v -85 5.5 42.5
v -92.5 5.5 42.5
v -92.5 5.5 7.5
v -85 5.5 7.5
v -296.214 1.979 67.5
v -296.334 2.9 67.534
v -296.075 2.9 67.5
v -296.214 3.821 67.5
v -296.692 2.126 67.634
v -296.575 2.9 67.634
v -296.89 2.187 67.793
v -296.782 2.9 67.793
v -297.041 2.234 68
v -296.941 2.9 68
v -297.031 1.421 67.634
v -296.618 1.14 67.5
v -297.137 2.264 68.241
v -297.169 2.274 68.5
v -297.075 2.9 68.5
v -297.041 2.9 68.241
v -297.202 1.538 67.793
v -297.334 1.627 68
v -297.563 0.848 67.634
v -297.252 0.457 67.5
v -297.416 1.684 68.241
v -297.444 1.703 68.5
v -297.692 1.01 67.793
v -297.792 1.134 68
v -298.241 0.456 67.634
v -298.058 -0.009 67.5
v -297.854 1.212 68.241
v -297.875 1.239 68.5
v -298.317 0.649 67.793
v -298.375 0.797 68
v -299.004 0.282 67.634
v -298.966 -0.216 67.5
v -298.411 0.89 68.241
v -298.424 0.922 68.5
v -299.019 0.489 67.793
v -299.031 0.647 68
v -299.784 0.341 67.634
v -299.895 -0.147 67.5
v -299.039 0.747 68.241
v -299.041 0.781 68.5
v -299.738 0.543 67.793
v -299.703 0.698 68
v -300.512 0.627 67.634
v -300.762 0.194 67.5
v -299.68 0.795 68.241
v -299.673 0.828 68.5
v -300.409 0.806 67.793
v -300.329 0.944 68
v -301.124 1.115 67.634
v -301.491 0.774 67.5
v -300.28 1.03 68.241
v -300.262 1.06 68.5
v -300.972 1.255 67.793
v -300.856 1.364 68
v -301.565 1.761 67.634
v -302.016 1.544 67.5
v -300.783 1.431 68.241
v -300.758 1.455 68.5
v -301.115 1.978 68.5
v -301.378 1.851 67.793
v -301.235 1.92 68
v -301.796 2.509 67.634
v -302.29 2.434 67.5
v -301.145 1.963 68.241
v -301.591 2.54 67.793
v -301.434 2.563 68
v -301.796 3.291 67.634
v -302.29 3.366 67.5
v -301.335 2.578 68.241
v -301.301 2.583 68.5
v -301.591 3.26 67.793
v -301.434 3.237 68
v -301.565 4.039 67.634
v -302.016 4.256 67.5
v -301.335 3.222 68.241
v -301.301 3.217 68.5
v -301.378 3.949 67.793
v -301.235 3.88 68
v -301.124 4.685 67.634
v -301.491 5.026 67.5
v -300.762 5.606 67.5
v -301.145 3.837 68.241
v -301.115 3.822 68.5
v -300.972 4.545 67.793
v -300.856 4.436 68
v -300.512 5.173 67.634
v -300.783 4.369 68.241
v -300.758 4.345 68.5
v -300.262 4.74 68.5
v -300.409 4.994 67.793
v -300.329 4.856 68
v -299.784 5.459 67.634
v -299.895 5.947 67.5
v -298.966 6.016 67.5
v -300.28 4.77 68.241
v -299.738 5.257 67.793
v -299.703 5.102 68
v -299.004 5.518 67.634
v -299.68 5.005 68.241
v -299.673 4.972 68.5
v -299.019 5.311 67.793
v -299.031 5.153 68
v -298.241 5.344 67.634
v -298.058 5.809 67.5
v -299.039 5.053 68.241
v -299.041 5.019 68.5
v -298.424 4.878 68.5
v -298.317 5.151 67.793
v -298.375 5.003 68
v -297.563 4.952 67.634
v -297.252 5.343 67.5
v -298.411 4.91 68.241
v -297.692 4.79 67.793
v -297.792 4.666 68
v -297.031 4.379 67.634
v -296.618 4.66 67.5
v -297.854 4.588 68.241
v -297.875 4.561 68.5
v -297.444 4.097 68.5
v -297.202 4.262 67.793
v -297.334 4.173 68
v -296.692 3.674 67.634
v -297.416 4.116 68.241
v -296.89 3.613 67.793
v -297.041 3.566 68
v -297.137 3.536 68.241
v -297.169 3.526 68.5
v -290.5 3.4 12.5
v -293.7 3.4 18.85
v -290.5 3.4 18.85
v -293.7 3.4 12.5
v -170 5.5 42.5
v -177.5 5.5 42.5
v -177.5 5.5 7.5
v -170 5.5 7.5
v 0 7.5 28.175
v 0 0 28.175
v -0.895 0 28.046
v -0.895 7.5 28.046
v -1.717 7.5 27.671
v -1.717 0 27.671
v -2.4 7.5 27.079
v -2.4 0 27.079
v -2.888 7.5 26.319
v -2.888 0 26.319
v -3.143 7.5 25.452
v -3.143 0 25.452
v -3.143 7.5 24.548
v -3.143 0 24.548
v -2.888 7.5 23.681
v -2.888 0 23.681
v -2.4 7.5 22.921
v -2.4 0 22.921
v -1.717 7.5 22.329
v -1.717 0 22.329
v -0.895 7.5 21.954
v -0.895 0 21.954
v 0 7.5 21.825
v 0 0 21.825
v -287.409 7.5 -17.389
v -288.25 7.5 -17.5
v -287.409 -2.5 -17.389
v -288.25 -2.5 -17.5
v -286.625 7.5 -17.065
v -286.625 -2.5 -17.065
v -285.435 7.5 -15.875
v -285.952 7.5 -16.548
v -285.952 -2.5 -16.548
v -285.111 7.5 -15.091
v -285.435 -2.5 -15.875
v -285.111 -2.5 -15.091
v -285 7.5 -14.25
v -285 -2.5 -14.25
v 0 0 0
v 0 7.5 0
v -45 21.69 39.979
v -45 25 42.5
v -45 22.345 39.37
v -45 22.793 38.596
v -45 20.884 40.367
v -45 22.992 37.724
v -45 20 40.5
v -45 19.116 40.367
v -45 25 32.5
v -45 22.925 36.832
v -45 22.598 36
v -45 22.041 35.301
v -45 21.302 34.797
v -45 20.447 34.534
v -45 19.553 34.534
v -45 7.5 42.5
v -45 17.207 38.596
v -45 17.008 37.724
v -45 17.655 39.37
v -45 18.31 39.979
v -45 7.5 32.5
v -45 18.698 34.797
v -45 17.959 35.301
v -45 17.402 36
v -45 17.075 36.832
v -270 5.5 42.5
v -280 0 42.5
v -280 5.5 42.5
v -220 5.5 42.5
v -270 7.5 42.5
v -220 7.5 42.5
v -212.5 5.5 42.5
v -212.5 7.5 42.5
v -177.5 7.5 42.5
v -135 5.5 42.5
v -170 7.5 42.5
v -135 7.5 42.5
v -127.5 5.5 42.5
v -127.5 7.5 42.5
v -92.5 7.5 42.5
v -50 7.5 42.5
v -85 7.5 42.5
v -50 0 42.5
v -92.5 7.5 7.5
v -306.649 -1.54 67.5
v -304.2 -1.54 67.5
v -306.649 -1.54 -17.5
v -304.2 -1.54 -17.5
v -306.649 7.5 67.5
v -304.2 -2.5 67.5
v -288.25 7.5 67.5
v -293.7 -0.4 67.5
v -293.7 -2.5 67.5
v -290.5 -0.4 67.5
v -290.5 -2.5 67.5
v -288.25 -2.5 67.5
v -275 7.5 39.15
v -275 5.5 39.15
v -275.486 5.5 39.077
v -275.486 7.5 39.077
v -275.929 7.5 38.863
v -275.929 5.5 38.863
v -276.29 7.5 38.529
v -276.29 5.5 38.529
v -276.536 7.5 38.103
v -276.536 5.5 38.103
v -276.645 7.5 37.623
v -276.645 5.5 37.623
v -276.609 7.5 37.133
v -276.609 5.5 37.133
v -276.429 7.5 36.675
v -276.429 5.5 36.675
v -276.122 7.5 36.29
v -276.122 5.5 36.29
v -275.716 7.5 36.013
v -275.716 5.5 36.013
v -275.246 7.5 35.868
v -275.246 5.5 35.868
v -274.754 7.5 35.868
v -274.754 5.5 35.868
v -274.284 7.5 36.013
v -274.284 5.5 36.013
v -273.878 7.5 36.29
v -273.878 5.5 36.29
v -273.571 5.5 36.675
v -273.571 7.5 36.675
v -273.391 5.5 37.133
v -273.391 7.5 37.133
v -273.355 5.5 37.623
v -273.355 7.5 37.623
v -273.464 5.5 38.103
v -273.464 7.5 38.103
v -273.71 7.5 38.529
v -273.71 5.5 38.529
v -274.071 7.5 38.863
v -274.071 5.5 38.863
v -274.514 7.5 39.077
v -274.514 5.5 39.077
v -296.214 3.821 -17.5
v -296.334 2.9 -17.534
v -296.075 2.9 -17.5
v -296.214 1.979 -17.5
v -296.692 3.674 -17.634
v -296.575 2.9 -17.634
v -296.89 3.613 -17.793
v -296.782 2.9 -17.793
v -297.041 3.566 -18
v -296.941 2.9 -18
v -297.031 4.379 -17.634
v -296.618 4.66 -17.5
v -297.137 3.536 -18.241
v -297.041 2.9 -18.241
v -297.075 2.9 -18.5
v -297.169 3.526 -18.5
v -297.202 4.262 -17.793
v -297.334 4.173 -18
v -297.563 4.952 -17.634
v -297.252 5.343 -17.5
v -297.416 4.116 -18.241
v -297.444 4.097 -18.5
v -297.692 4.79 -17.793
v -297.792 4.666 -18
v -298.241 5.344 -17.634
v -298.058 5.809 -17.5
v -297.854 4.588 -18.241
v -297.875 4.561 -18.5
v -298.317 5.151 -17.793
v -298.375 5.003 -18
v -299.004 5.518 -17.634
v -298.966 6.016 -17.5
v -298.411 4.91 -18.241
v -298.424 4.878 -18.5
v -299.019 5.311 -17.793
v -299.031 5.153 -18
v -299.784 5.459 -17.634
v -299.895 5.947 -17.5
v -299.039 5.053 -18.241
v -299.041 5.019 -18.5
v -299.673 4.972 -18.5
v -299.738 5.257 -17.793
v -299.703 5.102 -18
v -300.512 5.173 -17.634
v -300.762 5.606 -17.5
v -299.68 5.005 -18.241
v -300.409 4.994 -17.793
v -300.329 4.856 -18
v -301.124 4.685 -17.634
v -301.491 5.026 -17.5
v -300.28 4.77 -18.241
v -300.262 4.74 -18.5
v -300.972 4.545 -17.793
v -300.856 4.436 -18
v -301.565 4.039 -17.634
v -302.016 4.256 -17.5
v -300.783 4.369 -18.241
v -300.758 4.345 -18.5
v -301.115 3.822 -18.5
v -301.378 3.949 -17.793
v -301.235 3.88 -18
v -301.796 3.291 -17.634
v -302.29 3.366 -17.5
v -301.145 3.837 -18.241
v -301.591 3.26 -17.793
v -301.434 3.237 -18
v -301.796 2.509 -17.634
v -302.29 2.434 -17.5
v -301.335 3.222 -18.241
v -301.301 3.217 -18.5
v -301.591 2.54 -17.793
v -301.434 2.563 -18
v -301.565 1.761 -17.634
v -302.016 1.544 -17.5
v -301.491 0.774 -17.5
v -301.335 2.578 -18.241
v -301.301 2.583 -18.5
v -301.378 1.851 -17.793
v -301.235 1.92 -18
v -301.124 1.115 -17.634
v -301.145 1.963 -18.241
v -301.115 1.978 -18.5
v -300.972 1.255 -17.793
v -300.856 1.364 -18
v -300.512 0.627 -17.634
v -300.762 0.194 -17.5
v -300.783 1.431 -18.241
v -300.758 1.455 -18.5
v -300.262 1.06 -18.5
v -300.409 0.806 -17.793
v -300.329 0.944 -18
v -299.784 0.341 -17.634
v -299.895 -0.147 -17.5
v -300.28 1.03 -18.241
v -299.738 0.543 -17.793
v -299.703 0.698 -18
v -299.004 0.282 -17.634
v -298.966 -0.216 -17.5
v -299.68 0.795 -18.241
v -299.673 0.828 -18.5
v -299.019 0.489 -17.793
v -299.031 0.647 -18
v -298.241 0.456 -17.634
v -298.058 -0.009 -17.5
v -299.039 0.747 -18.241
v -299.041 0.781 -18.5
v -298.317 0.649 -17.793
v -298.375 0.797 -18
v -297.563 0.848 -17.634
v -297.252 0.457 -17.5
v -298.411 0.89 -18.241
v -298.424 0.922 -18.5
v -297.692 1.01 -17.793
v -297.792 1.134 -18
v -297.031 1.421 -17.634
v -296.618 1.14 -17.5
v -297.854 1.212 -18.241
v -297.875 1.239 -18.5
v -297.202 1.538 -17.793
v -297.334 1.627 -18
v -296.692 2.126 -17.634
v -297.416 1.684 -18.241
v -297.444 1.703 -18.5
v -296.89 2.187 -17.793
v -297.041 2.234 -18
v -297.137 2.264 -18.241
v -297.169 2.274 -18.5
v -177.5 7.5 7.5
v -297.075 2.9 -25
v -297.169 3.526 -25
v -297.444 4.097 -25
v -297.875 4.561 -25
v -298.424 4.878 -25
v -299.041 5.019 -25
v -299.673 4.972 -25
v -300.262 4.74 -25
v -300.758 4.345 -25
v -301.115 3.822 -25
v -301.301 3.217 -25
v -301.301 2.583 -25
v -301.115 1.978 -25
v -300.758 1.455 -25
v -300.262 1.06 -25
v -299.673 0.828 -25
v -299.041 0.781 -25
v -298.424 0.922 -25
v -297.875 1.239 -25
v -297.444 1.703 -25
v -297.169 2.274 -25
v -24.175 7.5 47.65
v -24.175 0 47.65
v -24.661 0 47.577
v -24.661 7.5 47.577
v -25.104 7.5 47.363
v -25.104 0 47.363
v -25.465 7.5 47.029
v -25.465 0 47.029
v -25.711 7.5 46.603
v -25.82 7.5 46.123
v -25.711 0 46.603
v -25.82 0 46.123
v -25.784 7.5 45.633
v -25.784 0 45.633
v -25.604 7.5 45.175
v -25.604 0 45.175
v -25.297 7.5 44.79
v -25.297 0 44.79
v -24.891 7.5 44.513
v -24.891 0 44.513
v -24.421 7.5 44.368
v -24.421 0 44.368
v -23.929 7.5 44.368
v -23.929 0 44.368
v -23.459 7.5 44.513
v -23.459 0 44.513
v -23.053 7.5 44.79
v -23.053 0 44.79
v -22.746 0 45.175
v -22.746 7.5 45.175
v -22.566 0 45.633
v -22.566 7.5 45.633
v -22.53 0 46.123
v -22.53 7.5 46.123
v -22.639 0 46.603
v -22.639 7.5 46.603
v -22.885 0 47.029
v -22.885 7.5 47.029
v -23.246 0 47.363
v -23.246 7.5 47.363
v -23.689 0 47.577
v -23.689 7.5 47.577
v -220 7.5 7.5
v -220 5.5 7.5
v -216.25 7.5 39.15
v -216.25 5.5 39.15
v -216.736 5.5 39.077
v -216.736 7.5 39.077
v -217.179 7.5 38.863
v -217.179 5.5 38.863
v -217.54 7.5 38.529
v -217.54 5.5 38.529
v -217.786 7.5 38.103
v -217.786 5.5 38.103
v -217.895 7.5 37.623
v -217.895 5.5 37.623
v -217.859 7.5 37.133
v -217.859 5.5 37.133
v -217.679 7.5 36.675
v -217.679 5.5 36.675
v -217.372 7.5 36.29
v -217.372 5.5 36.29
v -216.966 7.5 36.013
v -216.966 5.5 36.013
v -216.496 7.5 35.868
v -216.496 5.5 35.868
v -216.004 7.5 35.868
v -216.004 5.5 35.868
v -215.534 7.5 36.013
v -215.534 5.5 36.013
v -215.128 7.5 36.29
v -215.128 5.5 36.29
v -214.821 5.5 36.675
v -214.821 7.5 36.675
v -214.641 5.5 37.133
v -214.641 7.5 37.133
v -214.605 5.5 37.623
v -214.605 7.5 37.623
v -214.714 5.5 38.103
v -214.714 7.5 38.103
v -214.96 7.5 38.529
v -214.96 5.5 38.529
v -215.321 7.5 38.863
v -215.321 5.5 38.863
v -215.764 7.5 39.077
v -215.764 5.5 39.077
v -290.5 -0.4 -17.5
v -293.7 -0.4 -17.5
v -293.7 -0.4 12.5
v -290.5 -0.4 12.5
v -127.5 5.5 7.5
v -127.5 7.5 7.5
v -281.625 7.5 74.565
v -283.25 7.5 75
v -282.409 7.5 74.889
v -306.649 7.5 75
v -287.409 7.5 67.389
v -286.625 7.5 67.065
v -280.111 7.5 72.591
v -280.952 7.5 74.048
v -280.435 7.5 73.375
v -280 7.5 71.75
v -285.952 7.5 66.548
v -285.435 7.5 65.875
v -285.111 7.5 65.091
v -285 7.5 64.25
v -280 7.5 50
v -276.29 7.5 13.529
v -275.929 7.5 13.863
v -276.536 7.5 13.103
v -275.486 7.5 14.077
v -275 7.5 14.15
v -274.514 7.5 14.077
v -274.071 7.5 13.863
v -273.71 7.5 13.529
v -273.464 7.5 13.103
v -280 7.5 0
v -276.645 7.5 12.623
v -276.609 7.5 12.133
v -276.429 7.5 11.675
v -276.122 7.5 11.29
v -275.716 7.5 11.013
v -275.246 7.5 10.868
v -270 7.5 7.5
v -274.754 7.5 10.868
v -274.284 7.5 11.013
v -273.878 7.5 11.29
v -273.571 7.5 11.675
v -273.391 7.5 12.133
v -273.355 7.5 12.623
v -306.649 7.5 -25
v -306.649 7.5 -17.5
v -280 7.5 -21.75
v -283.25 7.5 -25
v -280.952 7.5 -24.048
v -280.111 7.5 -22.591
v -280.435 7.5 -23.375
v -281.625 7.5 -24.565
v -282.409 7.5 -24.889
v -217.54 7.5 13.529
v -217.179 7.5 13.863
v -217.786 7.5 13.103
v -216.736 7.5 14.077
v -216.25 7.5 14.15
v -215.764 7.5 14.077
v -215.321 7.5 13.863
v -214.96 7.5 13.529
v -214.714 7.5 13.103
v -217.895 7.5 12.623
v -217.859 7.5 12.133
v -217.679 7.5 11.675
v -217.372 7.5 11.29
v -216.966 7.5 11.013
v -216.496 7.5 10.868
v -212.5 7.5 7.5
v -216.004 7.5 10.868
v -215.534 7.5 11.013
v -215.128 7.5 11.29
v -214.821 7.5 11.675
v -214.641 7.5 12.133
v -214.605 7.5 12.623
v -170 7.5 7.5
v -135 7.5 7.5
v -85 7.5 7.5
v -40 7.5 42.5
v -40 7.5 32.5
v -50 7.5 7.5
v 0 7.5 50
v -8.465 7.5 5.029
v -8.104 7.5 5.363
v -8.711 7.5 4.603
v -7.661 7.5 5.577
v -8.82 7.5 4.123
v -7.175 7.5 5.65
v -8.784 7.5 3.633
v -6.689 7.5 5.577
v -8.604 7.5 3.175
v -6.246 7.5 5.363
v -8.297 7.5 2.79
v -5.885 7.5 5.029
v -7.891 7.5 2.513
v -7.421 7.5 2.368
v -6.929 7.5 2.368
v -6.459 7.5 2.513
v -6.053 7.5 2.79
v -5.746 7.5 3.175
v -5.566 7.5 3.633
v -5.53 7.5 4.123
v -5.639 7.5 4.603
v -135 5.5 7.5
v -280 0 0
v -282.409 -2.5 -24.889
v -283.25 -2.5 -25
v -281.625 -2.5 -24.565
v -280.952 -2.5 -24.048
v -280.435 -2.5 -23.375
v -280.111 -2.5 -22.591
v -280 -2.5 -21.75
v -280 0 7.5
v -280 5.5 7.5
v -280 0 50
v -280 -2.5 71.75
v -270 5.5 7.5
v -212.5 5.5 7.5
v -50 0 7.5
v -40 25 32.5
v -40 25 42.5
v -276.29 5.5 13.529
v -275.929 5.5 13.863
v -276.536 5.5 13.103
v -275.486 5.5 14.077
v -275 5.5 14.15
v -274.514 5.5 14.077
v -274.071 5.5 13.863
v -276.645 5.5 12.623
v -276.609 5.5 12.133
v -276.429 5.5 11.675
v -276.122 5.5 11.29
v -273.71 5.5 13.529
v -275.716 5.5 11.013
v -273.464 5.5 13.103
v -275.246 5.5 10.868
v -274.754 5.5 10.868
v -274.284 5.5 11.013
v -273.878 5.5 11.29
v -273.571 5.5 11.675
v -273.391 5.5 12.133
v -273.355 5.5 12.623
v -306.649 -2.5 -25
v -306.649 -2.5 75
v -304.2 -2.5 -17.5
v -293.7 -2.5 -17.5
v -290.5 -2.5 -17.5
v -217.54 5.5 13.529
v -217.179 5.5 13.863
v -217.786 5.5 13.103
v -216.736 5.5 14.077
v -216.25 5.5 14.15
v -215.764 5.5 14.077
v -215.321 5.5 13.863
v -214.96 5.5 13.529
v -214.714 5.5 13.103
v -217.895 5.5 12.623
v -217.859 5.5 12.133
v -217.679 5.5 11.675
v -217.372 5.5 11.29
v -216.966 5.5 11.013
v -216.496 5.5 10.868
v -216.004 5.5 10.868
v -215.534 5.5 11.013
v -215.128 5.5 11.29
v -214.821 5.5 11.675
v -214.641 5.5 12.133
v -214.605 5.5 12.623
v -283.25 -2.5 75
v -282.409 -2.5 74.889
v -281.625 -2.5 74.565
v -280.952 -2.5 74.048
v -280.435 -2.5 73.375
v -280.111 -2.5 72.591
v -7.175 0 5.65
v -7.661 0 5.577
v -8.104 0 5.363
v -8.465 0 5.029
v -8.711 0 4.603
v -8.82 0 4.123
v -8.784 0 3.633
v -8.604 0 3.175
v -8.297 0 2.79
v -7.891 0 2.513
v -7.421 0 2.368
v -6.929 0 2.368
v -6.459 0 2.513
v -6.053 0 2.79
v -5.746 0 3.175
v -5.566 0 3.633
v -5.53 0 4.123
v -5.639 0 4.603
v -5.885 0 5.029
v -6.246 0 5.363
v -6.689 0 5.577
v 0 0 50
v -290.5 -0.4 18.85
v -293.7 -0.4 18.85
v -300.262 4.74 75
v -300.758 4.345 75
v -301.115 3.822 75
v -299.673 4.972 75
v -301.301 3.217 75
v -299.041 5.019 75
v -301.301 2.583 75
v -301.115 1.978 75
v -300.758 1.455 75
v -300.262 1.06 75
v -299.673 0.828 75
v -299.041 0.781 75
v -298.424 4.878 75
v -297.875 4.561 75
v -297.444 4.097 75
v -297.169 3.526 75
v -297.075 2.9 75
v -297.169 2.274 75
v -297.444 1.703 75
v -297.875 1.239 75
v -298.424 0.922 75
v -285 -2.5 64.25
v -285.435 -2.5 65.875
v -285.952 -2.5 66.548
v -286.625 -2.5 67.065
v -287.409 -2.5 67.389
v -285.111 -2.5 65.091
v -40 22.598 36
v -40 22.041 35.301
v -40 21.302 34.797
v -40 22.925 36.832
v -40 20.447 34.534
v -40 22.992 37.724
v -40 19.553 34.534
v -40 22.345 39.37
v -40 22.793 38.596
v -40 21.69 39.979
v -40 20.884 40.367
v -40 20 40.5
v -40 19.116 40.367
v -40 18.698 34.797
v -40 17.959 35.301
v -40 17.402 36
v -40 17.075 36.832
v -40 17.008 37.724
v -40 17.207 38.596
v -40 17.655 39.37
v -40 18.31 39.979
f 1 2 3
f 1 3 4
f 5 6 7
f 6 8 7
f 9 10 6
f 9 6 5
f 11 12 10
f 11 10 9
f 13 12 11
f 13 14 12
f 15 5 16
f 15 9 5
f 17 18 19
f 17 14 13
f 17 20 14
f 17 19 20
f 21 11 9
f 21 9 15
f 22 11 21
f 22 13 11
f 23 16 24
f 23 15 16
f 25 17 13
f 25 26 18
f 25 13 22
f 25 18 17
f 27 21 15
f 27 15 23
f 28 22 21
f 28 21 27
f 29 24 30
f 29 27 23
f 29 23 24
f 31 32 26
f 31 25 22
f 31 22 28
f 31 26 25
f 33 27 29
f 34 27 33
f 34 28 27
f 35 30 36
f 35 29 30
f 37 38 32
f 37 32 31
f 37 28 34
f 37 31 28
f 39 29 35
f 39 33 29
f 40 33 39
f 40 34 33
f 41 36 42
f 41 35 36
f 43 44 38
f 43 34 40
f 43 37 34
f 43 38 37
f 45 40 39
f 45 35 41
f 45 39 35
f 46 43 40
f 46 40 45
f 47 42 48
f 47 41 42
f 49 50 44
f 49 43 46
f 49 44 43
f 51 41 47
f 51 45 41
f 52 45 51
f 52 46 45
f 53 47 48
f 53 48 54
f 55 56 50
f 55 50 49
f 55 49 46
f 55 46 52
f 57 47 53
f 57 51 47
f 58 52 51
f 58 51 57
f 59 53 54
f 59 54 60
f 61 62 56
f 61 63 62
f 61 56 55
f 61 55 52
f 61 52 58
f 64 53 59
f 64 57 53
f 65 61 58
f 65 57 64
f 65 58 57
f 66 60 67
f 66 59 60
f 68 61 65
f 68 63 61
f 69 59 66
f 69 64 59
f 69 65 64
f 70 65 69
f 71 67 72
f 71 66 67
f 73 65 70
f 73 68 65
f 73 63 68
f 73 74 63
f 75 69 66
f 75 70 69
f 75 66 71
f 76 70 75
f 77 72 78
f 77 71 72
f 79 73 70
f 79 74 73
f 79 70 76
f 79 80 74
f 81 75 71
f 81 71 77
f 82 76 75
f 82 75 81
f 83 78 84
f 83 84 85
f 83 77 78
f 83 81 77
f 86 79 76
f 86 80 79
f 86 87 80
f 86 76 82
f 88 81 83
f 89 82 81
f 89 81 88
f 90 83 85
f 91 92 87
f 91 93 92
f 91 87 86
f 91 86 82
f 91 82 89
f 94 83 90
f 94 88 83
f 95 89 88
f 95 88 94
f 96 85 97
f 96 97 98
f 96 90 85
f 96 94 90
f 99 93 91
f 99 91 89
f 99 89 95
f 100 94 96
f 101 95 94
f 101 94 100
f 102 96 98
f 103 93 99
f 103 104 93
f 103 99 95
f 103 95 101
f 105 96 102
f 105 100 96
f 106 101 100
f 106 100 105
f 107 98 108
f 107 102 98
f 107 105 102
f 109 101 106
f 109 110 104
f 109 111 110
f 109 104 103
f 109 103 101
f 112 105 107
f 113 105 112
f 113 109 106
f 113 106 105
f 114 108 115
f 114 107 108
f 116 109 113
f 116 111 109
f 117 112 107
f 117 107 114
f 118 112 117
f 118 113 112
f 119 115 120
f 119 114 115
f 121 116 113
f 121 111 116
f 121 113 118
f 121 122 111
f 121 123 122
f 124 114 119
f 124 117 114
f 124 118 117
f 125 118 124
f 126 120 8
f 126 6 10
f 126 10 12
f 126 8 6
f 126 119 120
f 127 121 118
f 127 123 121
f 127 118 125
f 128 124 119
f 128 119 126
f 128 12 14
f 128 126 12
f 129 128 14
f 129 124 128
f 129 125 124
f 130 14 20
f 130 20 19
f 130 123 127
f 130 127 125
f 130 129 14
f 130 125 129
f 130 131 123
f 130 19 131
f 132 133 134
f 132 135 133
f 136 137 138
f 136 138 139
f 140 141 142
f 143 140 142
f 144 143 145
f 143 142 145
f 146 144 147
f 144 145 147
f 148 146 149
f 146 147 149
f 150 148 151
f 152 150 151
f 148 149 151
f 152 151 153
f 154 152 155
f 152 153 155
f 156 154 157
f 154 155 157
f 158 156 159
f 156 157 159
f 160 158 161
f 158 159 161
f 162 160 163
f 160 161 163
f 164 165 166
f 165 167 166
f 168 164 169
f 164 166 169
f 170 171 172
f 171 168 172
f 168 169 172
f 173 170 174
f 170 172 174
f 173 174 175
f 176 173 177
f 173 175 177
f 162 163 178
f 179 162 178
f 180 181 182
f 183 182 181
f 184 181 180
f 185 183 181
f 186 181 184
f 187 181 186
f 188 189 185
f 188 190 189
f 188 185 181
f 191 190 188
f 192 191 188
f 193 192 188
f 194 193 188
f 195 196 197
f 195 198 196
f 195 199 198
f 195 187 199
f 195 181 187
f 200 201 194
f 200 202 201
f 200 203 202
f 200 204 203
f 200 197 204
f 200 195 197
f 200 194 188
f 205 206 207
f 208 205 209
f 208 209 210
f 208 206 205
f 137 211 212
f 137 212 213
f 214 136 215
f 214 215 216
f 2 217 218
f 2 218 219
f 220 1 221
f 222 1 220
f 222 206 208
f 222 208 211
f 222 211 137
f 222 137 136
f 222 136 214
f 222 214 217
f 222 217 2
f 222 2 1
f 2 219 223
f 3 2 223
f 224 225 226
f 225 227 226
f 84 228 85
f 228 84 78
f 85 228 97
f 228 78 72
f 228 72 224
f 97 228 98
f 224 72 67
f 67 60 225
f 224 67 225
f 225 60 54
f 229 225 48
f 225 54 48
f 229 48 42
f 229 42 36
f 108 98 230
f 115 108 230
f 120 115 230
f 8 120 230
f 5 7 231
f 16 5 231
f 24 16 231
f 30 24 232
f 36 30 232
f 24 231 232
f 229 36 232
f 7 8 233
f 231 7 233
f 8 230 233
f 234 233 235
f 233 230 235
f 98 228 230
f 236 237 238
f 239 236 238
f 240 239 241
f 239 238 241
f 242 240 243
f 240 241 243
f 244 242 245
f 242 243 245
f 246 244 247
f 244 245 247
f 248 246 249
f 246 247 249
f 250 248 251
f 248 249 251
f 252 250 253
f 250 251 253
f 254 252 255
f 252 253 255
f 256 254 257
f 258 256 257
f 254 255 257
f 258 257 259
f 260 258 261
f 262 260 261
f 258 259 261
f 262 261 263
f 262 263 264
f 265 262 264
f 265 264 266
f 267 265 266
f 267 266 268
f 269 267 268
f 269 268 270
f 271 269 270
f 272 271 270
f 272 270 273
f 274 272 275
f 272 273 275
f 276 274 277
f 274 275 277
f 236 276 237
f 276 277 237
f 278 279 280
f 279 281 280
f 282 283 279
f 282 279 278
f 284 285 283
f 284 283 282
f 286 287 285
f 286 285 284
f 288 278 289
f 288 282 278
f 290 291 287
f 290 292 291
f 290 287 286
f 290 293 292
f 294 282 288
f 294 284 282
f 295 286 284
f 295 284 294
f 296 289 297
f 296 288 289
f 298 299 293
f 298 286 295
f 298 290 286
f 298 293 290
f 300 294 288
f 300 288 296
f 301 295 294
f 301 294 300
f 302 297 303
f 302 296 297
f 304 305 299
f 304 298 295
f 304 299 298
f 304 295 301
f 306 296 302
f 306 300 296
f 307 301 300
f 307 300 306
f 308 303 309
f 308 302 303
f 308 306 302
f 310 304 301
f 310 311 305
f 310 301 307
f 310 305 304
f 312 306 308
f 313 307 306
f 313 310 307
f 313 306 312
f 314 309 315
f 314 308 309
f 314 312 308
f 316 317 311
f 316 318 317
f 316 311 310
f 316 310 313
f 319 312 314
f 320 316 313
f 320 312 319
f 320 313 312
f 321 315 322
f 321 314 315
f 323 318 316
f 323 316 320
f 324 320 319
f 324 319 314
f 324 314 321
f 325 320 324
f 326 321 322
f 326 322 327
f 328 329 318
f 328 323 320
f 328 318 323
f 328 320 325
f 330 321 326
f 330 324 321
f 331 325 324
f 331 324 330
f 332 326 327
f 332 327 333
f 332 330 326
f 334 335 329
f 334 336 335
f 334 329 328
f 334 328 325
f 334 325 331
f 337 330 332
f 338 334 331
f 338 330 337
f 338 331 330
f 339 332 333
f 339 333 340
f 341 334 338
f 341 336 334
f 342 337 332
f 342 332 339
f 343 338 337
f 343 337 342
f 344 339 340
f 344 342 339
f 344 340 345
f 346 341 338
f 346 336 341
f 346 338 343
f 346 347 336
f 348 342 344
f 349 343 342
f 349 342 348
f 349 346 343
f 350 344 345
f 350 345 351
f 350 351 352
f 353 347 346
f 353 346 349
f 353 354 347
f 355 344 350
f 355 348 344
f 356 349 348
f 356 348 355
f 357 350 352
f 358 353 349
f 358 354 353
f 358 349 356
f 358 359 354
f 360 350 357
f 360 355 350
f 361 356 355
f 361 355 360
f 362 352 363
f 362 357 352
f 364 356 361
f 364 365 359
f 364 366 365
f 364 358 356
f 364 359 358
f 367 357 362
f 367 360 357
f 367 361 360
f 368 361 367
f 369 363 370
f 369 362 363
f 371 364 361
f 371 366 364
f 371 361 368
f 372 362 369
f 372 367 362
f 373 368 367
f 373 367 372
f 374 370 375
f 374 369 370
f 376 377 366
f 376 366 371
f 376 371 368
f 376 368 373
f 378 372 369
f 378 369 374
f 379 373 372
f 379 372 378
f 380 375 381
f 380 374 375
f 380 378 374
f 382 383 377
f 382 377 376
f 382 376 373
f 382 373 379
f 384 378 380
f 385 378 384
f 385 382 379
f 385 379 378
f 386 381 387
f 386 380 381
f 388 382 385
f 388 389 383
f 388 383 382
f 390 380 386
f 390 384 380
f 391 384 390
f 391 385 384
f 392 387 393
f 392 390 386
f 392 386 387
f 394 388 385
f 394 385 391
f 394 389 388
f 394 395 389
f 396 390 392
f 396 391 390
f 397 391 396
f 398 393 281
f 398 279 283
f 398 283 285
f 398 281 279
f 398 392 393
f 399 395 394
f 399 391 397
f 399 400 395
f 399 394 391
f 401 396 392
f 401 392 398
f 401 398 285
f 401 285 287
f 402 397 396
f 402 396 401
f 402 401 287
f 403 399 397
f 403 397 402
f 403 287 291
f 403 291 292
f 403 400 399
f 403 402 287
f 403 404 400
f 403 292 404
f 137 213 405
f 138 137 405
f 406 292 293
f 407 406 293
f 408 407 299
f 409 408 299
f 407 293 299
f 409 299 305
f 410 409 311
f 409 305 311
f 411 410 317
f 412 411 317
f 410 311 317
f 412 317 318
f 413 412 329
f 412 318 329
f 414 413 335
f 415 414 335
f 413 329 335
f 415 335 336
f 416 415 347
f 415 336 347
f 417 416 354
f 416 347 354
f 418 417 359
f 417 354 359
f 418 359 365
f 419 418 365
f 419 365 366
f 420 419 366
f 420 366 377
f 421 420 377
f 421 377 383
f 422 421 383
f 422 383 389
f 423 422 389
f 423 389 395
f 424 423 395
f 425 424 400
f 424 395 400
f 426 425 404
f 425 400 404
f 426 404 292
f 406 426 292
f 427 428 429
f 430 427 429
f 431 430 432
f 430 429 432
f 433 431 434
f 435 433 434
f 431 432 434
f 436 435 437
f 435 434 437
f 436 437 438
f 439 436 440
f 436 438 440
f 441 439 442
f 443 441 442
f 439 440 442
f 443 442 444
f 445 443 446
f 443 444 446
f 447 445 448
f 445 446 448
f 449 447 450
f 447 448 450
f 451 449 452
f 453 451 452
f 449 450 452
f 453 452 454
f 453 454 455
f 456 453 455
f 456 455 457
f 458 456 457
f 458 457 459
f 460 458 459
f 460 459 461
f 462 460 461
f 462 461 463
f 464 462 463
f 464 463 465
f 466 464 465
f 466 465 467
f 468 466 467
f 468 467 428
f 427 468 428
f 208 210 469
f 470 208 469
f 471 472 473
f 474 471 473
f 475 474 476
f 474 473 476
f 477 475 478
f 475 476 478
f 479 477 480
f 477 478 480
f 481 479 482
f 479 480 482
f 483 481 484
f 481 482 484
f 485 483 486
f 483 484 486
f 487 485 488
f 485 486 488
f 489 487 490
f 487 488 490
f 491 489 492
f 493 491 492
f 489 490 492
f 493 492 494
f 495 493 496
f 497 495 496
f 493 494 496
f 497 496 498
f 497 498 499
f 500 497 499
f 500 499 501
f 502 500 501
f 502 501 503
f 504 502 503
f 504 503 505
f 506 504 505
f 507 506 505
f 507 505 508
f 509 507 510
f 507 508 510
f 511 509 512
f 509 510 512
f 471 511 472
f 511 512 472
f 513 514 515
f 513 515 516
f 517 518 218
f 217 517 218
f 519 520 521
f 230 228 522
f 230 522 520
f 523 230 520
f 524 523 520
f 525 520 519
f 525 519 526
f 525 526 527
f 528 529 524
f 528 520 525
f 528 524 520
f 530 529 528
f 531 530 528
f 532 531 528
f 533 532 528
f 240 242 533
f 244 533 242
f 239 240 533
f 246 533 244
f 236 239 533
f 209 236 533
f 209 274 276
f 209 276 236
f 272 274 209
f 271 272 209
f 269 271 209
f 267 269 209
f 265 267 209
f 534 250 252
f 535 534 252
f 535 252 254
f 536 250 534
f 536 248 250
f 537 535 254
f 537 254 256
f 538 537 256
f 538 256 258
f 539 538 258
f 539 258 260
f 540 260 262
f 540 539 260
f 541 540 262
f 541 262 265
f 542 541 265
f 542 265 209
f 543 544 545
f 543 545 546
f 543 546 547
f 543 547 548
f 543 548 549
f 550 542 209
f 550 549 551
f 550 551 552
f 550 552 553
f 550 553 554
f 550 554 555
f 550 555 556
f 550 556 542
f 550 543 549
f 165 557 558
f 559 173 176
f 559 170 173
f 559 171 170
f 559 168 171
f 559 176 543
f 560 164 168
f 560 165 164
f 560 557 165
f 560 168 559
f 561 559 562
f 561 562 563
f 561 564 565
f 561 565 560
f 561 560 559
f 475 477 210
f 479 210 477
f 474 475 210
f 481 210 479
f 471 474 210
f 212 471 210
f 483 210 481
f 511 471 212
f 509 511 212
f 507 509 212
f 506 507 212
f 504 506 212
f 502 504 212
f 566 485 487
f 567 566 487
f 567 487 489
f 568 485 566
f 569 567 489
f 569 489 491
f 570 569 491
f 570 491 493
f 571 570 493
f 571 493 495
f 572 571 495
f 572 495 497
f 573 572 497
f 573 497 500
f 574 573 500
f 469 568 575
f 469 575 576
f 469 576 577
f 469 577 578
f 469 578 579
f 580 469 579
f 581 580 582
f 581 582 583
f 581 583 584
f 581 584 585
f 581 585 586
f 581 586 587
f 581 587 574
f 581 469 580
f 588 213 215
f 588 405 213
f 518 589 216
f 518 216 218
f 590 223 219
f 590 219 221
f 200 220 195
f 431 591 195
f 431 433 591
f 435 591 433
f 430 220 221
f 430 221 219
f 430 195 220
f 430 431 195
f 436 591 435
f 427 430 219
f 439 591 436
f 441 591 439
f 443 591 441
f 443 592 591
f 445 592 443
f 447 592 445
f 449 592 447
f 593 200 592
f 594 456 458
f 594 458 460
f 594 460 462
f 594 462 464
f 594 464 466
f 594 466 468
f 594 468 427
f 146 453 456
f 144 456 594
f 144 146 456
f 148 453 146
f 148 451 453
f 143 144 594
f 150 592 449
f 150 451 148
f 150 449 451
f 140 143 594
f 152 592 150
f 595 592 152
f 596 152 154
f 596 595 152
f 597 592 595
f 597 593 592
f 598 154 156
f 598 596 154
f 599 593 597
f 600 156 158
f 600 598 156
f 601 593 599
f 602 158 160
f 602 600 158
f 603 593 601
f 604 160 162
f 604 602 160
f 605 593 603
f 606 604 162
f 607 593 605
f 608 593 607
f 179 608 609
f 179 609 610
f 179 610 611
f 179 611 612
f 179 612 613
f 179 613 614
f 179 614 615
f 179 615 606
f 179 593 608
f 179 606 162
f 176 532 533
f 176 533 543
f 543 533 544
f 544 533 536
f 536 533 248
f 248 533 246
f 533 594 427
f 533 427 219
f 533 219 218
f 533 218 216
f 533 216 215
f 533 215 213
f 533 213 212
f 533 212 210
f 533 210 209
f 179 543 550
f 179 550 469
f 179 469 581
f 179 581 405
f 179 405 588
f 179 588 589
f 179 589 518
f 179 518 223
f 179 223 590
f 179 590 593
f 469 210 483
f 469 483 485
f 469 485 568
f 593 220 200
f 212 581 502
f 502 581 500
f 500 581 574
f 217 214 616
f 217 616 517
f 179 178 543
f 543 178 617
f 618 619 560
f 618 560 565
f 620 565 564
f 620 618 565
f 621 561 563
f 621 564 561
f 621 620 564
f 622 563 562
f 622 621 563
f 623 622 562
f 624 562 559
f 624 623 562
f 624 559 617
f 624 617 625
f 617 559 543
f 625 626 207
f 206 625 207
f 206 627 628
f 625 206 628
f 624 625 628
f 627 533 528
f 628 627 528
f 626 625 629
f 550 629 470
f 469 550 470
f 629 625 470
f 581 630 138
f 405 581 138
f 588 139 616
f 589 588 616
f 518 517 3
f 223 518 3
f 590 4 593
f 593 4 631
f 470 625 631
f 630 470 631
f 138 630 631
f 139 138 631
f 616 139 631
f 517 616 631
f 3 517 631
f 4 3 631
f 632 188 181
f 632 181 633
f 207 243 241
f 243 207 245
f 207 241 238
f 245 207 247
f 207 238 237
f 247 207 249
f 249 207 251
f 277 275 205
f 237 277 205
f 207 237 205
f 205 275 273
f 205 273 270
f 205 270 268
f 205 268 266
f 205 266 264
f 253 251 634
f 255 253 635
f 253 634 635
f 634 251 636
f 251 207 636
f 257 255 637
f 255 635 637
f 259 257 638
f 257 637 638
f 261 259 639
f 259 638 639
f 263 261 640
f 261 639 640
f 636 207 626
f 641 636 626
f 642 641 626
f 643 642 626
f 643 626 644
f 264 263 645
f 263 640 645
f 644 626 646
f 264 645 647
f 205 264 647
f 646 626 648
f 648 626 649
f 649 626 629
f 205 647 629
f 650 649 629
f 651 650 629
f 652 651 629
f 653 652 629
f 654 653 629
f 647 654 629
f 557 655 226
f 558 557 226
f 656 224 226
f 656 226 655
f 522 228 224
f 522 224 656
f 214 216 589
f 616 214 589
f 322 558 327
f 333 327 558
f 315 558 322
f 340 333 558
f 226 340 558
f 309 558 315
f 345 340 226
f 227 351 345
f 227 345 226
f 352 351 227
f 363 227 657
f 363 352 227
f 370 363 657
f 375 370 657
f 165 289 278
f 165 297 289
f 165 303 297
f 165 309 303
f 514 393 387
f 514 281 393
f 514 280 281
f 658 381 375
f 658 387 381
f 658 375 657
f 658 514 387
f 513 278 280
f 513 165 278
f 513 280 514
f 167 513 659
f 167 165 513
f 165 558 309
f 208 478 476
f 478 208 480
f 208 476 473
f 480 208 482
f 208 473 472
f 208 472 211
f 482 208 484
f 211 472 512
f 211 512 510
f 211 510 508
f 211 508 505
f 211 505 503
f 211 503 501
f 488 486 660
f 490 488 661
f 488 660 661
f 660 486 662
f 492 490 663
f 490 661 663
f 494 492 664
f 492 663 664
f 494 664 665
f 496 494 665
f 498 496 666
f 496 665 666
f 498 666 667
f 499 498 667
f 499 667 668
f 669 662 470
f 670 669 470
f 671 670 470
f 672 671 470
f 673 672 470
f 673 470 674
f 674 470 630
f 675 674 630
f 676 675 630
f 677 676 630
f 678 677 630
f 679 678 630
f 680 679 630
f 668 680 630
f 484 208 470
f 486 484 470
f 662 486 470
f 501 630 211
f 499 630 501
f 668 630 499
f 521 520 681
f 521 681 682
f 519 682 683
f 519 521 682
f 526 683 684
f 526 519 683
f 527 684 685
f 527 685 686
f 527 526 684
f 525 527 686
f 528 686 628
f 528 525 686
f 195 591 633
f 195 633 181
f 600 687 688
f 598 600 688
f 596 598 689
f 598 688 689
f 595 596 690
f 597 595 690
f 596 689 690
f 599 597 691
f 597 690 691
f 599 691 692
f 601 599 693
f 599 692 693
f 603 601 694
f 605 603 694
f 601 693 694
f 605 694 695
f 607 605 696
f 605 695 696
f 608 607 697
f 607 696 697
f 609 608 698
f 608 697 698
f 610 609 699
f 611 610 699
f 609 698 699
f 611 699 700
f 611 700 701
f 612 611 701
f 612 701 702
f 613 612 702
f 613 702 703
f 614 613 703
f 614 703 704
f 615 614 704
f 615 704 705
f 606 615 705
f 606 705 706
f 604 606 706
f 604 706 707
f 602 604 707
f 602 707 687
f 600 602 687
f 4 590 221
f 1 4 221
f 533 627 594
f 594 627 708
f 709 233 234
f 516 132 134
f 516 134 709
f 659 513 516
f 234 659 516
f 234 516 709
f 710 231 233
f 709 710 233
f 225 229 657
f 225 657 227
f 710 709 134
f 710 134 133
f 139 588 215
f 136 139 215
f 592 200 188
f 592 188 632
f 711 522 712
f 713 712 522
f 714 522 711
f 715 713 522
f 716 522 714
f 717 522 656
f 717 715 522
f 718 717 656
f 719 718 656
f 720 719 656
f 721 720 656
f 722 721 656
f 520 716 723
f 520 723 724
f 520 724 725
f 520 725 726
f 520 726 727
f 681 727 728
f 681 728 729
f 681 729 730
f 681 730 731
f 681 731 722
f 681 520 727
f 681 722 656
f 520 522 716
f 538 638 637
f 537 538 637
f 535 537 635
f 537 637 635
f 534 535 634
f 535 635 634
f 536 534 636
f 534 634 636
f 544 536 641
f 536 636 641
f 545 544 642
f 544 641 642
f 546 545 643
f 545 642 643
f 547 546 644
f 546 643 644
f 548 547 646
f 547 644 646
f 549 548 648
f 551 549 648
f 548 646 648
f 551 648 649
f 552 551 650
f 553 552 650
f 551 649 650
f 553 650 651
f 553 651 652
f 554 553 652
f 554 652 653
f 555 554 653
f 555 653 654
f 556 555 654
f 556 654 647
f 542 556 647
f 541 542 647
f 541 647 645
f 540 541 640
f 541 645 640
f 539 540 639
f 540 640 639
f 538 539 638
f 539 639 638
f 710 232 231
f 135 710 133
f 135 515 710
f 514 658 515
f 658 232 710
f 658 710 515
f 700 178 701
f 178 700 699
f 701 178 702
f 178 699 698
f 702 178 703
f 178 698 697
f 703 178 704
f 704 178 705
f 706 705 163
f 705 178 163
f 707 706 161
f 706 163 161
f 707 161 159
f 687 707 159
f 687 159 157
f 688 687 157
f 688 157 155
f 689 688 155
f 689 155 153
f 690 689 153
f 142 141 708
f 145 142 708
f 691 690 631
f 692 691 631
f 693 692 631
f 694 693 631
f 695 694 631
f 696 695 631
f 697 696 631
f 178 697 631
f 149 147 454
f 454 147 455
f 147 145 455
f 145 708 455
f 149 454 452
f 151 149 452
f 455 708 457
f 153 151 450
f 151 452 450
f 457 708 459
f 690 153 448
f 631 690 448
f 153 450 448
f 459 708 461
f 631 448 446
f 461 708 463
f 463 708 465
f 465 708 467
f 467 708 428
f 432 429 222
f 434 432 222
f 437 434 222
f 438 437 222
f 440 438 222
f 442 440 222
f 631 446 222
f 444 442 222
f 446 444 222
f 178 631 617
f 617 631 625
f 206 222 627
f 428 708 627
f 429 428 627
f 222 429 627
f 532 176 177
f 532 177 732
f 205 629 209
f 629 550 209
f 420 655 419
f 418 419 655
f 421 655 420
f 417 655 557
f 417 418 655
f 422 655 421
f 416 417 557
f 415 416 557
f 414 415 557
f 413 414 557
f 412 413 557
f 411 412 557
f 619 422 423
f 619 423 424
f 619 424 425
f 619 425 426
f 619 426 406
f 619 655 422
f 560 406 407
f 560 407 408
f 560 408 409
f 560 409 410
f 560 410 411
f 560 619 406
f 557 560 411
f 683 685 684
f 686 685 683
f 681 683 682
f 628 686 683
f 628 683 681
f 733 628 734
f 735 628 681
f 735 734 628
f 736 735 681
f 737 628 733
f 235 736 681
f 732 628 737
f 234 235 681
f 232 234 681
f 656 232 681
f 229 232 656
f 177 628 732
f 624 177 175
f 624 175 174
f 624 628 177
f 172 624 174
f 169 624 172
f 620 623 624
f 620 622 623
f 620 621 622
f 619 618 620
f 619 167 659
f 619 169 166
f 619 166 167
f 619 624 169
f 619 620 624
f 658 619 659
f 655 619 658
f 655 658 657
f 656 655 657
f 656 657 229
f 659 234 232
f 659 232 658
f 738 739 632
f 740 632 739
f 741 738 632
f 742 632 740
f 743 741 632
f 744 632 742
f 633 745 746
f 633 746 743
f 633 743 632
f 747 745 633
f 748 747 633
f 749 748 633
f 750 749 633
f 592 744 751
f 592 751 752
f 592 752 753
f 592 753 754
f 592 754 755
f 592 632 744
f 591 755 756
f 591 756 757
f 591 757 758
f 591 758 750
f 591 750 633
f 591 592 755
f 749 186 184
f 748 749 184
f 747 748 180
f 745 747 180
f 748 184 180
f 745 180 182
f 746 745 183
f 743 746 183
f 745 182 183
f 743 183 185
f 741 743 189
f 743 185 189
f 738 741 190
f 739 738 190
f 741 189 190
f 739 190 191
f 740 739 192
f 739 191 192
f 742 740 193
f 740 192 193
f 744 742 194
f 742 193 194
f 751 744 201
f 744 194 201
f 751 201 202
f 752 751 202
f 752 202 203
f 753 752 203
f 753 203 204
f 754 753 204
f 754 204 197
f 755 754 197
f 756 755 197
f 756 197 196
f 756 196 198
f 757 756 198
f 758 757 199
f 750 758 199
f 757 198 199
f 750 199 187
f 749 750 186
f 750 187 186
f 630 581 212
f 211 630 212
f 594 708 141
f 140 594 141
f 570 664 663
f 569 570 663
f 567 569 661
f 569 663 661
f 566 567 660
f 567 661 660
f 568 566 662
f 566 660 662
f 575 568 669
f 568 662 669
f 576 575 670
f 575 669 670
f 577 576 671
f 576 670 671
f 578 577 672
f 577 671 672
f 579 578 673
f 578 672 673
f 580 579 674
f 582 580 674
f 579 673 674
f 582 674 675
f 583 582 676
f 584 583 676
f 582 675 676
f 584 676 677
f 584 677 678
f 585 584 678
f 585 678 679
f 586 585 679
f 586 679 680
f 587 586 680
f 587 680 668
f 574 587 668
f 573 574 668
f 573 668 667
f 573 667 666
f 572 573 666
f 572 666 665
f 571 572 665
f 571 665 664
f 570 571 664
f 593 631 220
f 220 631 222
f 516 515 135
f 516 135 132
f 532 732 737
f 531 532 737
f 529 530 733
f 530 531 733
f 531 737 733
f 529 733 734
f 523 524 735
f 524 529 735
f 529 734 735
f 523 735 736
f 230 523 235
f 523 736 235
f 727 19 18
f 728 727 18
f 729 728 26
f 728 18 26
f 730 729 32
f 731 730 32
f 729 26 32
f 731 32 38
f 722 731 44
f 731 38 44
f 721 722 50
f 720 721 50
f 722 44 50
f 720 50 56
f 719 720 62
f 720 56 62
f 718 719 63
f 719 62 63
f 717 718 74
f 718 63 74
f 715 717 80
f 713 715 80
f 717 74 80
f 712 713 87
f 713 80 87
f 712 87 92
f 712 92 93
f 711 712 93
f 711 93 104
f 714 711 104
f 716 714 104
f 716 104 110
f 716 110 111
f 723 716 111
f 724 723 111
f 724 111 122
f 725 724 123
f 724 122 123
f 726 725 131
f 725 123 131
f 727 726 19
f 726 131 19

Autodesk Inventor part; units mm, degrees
ref_plane "YZ Plane" through (0, 0, 0) normal (1, 0, 0) x (0, 1, 0)
ref_plane "XZ Plane" through (0, 0, 0) normal (0, 1, 0) x (-1, 0, 0)
ref_plane "XY Plane" through (0, 0, 0) normal (0, 0, 1) x (1, 0, 0)
sketch "Sketch1" plane through (0, 0, 0) normal (0, 1, 0) x (-1, 0, 0)
  line L0 (0, 0) -> (50, 0)
  line L1 (50, 0) -> (50, 50)
  line L2 (50, 50) -> (0, 50)
  line L3 (0, 50) -> (0, 0)
  line L4 (50, 50) -> (290, 50)
  line L5 (290, 50) -> (290, 42.5)
  line L6 (290, 42.5) -> (50, 42.5)
  line L7 (50, 42.5) -> (50, 50)
  line L8 (50, 0) -> (290, 0)
  line L9 (290, 0) -> (290, 7.5)
  line L10 (290, 7.5) -> (50, 7.5)
  line L11 (50, 7.5) -> (50, 0)
  dimension "d0" = 50
  dimension "d1" = 50
  dimension "d2" = 240
  dimension "d3" = 7.5
  dimension "d4" = 7.5
extrude "Extrusion1" add sketch "Sketch1" along normal blind 7.5
sketch "Sketch2" plane through (0, 7.5, 0) normal (0, 1, 0) x (1, 0, 0)
  line L0 (0, -50) -> (0, 0) projected
  point P0 (0, -25)
hole "Hole1" at (0, 7.5, 25) direction (0, -1, 0) diameter 6.35 end through all
sketch "Sketch3" plane through (0, 7.5, 0) normal (0, 1, 0) x (1, 0, 0)
  line L0 (-3.175, -50) -> (-3.175, 0) construction
  line L1 (-3.175, -50) -> (-28.175, -50) construction
  line L2 (-28.175, -50) -> (-28.175, 0) construction
  line L3 (-28.175, 0) -> (-3.175, 0) construction
  point P0 (0, 0)
  point P1 (-7.175, -4)
  point P2 (-24.175, -46)
  dimension "d14" = 25
hole "Hole2" at (-7.175, 7.5, 4) at (-24.175, 7.5, 46) direction (0, -1, 0) diameter 3.3 end through all
sketch "Sketch4" plane through (0, 7.5, 0) normal (0, 1, 0) x (1, 0, 0)
  arc A0 (0, -21.825) -> (0, -28.175) centre (0, -25) ccw construction
  line L0 (-3.175, -25) -> (-28.175, -25) construction
  line L1 (-3.175, -25) -> (21.825, -25) construction
  line L2 (-290, -50) -> (0, -50) construction
  line L3 (-28.175, -50) -> (-28.175, 0) construction
  line L4 (-50, -7.5) -> (-50, -42.5) construction
  line L5 (-50, -42.5) -> (-45, -42.5) construction
  line L6 (-45, -42.5) -> (-45, -32.5) construction
  line L7 (-45, -32.5) -> (-50, -32.5) construction
  line L8 (-50, -32.5) -> (-50, -42.5) construction
  line L9 (-45, -32.5) -> (-40, -32.5)
  line L10 (-40, -32.5) -> (-40, -42.5)
  line L11 (-40, -42.5) -> (-45, -42.5)
  line L12 (-45, -42.5) -> (-45, -32.5)
  point P0 (0, 0)
  dimension "d22" = 25
  dimension "d23" = 180
  dimension "d24" = 5
  dimension "d25" = 10
  dimension "d26" = 5
extrude "Extrusion2" add sketch "Sketch4" along normal blind 17.5
sketch "Sketch5" plane through (0, 7.5, 0) normal (0, 1, 0) x (1, 0, 0)
  line L0 (-85, -7.5) -> (-85, -42.5)
  line L1 (-127.5, -7.5) -> (-127.5, -42.5)
  line L2 (-92.5, -42.5) -> (-92.5, -7.5)
  line L3 (-135, -7.5) -> (-170, -7.5) construction
  line L4 (-170, -7.5) -> (-170, -42.5) construction
  line L5 (-170, -42.5) -> (-135, -42.5) construction
  line L6 (-135, -42.5) -> (-135, -7.5) construction
  line L7 (-177.5, -7.5) -> (-212.5, -7.5) construction
  line L8 (-212.5, -7.5) -> (-212.5, -42.5) construction
  line L9 (-212.5, -42.5) -> (-177.5, -42.5) construction
  line L10 (-177.5, -42.5) -> (-177.5, -7.5) construction
  line L11 (-220, -7.5) -> (-255, -7.5) construction
  line L12 (-255, -7.5) -> (-255, -42.5) construction
  line L13 (-255, -42.5) -> (-220, -42.5) construction
  line L14 (-220, -42.5) -> (-220, -7.5) construction
  line L15 (-85, -7.5) -> (-92.5, -7.5) construction
  line L16 (-92.5, -7.5) -> (-92.5, -42.5) construction
  line L17 (-92.5, -42.5) -> (-85, -42.5) construction
  line L18 (-85, -42.5) -> (-85, -7.5) construction
  line L19 (-127.5, -7.5) -> (-135, -7.5) construction
  line L20 (-135, -7.5) -> (-135, -42.5) construction
  line L21 (-135, -42.5) -> (-127.5, -42.5) construction
  line L22 (-127.5, -42.5) -> (-127.5, -7.5) construction
  line L23 (-170, -7.5) -> (-177.5, -7.5) construction
  line L24 (-177.5, -7.5) -> (-177.5, -42.5) construction
  line L25 (-177.5, -42.5) -> (-170, -42.5) construction
  line L26 (-170, -42.5) -> (-170, -7.5) construction
  line L27 (-212.5, -7.5) -> (-220, -7.5) construction
  line L28 (-220, -7.5) -> (-220, -42.5) construction
  line L29 (-220, -42.5) -> (-212.5, -42.5) construction
  line L30 (-212.5, -42.5) -> (-212.5, -7.5) construction
  line L31 (-220, -7.5) -> (-212.5, -7.5)
  line L32 (-212.5, -7.5) -> (-212.5, -42.5)
  line L33 (-212.5, -42.5) -> (-220, -42.5)
  line L34 (-220, -42.5) -> (-220, -7.5)
  line L35 (-177.5, -7.5) -> (-170, -7.5)
  line L36 (-170, -7.5) -> (-170, -42.5)
  line L37 (-170, -42.5) -> (-177.5, -42.5)
  line L38 (-177.5, -42.5) -> (-177.5, -7.5)
  line L39 (-135, -7.5) -> (-127.5, -7.5)
  line L40 (-127.5, -7.5) -> (-127.5, -42.5)
  line L41 (-127.5, -42.5) -> (-135, -42.5)
  line L42 (-135, -42.5) -> (-135, -7.5)
  line L43 (-92.5, -7.5) -> (-85, -7.5)
  line L44 (-85, -7.5) -> (-85, -42.5)
  line L45 (-85, -42.5) -> (-92.5, -42.5)
  line L46 (-92.5, -42.5) -> (-92.5, -7.5)
  point P0 (0, 0)
  point P1 (-50, -7.5)
  dimension "d30" = 35
  dimension "d31" = 35
  dimension "d32" = 35
  dimension "d33" = 35
  dimension "d34" = 35
  dimension "d35" = 35
extrude "Extrusion3" add sketch "Sketch5" against normal blind 2
sketch "Sketch6" plane through (0, 7.5, 0) normal (0, 1, 0) x (1, 0, 0)
  line L0 (-290, 0) -> (-290, -7.5) projected
  line L1 (-290, -50) -> (0, -50) projected
  line L2 (-290, 0) -> (-280, 0)
  line L3 (-280, 0) -> (-280, -50)
  line L4 (-280, -50) -> (-290, -50)
  line L5 (-290, -50) -> (-290, 0)
  point P0 (0, 0)
  dimension "d38" = 10
extrude "Extrusion4" cut sketch "Sketch6" against normal blind 7.5
sketch "Sketch7" plane through (-280, 7.5, 0) normal (-1, 0, 0) x (0, 0, 1)
  point P0 (0, -7.5)
sketch "Sketch8" plane through (-280, 7.5, 0) normal (-1, 0, 0) x (0, 0, 1)
  line L0 (-25, 0) -> (75, 0)
  line L1 (75, 0) -> (75, -7.5)
  line L2 (75, -7.5) -> (-25, -7.5)
  line L3 (-25, -7.5) -> (-25, 0)
  line L4 (-25, 0) -> (75, 0)
  line L5 (75, 0) -> (75, -10)
  line L6 (75, -10) -> (-25, -10)
  line L7 (-25, -10) -> (-25, 0)
  point P0 (0, -7.5)
  dimension "d41" = 100
  dimension "d42" = 10
extrude "Extrusion5" add sketch "Sketch8" along normal blind 7.5
sketch "Sketch9" plane through (-287.5, 7.5, 0) normal (-1, 0, 0) x (0, 0, 1)
  line L0 (75, 0) -> (-25, 0) projected
  line L1 (-25, -10) -> (75, -10) projected
  line L2 (-25, 0) -> (-17.5, 0)
  line L3 (-17.5, 0) -> (-17.5, -10)
  line L4 (-17.5, -10) -> (-25, -10)
  line L5 (-25, -10) -> (-25, 0)
  line L6 (75, 0) -> (67.5, 0)
  line L7 (67.5, 0) -> (67.5, -10)
  line L8 (67.5, -10) -> (75, -10)
  line L9 (75, -10) -> (75, 0)
  point P0 (0, -7.5)
  dimension "d45" = 7.5
  dimension "d46" = 7.5
extrude "Extrusion6" add sketch "Sketch9" along normal blind 25 contours L9 L1 L7 L0 | L3 L1 L5 L0
sketch "Sketch10" plane through (-287.5, -2.5, -17.5) normal (0, 0, 1) x (1, 0, 0)
  line L0 (0, 0) -> (-25, 0) construction
  line L1 (0, 0) -> (-3, 0) construction
  line L2 (-3, 0) -> (-6.2, 0)
  line L3 (-6.2, 0) -> (-6.2, 2.1)
  line L4 (-6.2, 2.1) -> (-3, 2.1)
  line L5 (-3, 2.1) -> (-3, 0)
  line L6 (-6.2, 2.1) -> (-11.7, 2.1) construction
  line L7 (-11.7, 2.1) -> (-11.7, 5.4) construction
  point P0 (287.5, 2.5)
  dimension "d49" = 3
  dimension "d50" = 3.2
  dimension "d51" = 2.1
  dimension "d52" = 5.5
  dimension "d53" = 3.3
extrude "Extrusion7" add sketch "Sketch10" along normal blind 92.5
sketch "Sketch11" plane through (-287.5, -2.5, -17.5) normal (0, 0, 1) x (1, 0, 0)
  line L0 (-6.2, 2.1) -> (-3, 2.1) construction
  line L1 (-6.2, 2.1) -> (-11.7, 2.1) construction
  line L2 (-11.7, 2.1) -> (-11.7, 5.4) construction
  circle A0 centre (-11.7, 5.4) radius 2.125
  point P0 (287.5, 2.5)
  dimension "d56" = 5.5
  dimension "d57" = 3.3
  dimension "d58" = 4.25
extrude "Extrusion8" cut sketch "Sketch11" along normal mid plane 241
sketch "Sketch12" plane through (-287.5, -2.5, -17.5) normal (0, 0, 1) x (1, 0, 0)
  circle A0 centre (-11.7, 5.4) radius 2.125 construction
  line L0 (-11.7, 5.4) -> (-11.7, 0.96) construction
  line L1 (-11.7, 0.96) -> (-16.7, 0.96) construction
  line L2 (-6.2, 0) -> (-25, 0) projected
  line L3 (-16.7, 0.96) -> (-19.2, 0.96)
  line L4 (-19.2, 0.96) -> (-19.2, 0)
  line L5 (-19.2, 0) -> (-16.7, 0)
  line L6 (-16.7, 0) -> (-16.7, 0.96)
  point P0 (287.5, 2.5)
  dimension "d61" = 4.44
  dimension "d62" = 5
  dimension "d63" = 2.5
extrude "Extrusion9" add sketch "Sketch12" along normal blind 91.25
sketch "Sketch13" plane through (-293.7, -0.4, -17.5) normal (0, 1, 0) x (1, 0, 0)
  line L0 (3.2, 0) -> (3.2, -85) construction
  line L1 (3.2, 0) -> (3.2, -30) construction
  line L2 (0, 0) -> (0, -85) construction
  line L3 (3.2, -30) -> (0, -30) construction
  line L4 (0, -30) -> (0, -36.35) construction
  line L5 (0, -36.35) -> (3.2, -36.35) construction
  line L6 (3.2, -36.35) -> (3.2, -30) construction
  line L7 (0, -30) -> (3.2, -30)
  line L8 (3.2, -30) -> (3.2, -36.35)
  line L9 (3.2, -36.35) -> (0, -36.35)
  line L10 (0, -36.35) -> (0, -30)
  point P0 (293.7, -17.5)
  dimension "d66" = 30
  dimension "d67" = 6.35
extrude "Extrusion10" add sketch "Sketch13" along normal blind 3.8
sketch "Sketch14" plane through (0, 7.5, 0) normal (0, 1, 0) x (1, 0, 0)
  line L0 (-287.5, 17.5) -> (-287.5, -67.5) projected
  line L1 (-287.5, 17.5) -> (-285, 17.5)
  line L2 (-285, 17.5) -> (-285, -67.5)
  line L3 (-285, -67.5) -> (-287.5, -67.5)
  line L4 (-287.5, -67.5) -> (-287.5, 17.5)
  point P0 (0, 0)
  dimension "d70" = 2.5
extrude "Extrusion11" cut sketch "Sketch14" against normal blind 14.55
sketch "Sketch15" plane through (0, 7.5, 0) normal (0, 1, 0) x (1, 0, 0)
  line L0 (-312.5, 17.5) -> (-312.5, 25) projected
  line L1 (-280, -75) -> (-312.5, -75) projected
  line L2 (-312.5, 25) -> (-306.6488, 25)
  line L3 (-306.6488, 25) -> (-306.6488, -75)
  line L4 (-306.6488, -75) -> (-312.5, -75)
  line L5 (-312.5, -75) -> (-312.5, 25)
  point P0 (0, 0)
extrude "Extrusion12" cut sketch "Sketch15" against normal blind 14.55
fillet "Fillet1" radius 1 1 edges at (-301.325, 2.9, -17.5)
fillet "Fillet2" radius 1 1 edges at (-301.325, 2.9, 67.5)
fillet "Fillet3" radius 3.25 1 edges at (-280, 2.5, 75)
fillet "Fillet4" radius 3.25 1 edges at (-285, 2.5, 67.5)
fillet "Fillet5" radius 3.25 1 edges at (-280, 2.5, -25)
fillet "Fillet6" radius 3.25 1 edges at (-285, 2.5, -17.5)
sketch "Sketch16" plane through (0, 7.5, 0) normal (0, 1, 0) x (1, 0, 0)
  line L0 (-220, -42.5) -> (-220, -7.5) construction
  line L1 (-220, -42.5) -> (-280, -42.5) construction
  line L2 (-220, -7.5) -> (-255, -7.5) construction
  line L3 (-255, -7.5) -> (-255, -42.5) construction
  line L4 (-255, -42.5) -> (-220, -42.5) construction
  line L5 (-220, -42.5) -> (-220, -7.5) construction
  line L6 (-280, -7.5) -> (-280, 0) projected
  line L7 (-280, -7.5) -> (-270, -7.5)
  line L8 (-270, -7.5) -> (-270, -42.5)
  line L9 (-270, -42.5) -> (-280, -42.5)
  line L10 (-280, -42.5) -> (-280, -7.5)
  point P0 (0, 0)
  dimension "d81" = 35
  dimension "d82" = 10
extrude "Extrusion13" add sketch "Sketch16" against normal blind 2
sketch "Sketch17" plane through (0, 7.5, 0) normal (0, 1, 0) x (1, 0, 0)
  point P0 (0, 0)
sketch "Sketch18" plane through (0, 7.5, 0) normal (0, 1, 0) x (1, 0, 0)
  line L0 (-270, -7.5) -> (-270, -42.5) construction
  line L1 (-285, -64.25) -> (-285, 14.25) construction
  line L2 (-280, -7.5) -> (-280, 0) construction
  line L3 (-270, -7.5) -> (-280, -7.5) construction
  line L4 (-275, -7.5) -> (-275, -42.5) construction
  line L5 (-50, -42.5) -> (-280, -42.5) construction
  circle A0 centre (-275, -12.5) radius 1.8 construction
  circle A1 centre (-275, -37.5) radius 1.8 construction
  circle A2 centre (-275, -12.5) radius 1.8
  circle A3 centre (-275, -37.5) radius 1.8
  point P0 (0, 0)
  dimension "d85" = 3.6
  dimension "d86" = 3.6
hole "Hole3" at (-275, 7.5, 12.5) at (-275, 7.5, 37.5) direction (0, -1, 0) diameter 3.3 depth 15 tip angle 118
sketch "Sketch19" plane through (0, 7.5, 0) normal (0, 1, 0) x (1, 0, 0)
  circle A0 centre (-275, -12.5) radius 1.65 construction
  line L0 (-275, -12.5) -> (-212.5, -12.5) construction
  line L1 (-212.5, -7.5) -> (-212.5, -42.5) construction
  circle A1 centre (-275, -37.5) radius 1.65 construction
  line L2 (-275, -37.5) -> (-212.5, -37.5) construction
  line L3 (-220, -42.5) -> (-220, -7.5) construction
  line L4 (-220, -12.5) -> (-212.5, -12.5) construction
  line L5 (-216.25, -12.5) -> (-216.25, -37.5) construction
  point P0 (0, 0)
hole "Hole4" at (-216.25, 7.5, 12.5) at (-216.25, 7.5, 37.5) direction (0, -1, 0) diameter 3.3 depth 15 tip angle 118
sketch "Sketch20" plane through (-45, 7.5, 32.5) normal (-1, 0, 0) x (0, 0, 1)
  line L0 (10, 17.5) -> (0, 17.5) construction
  line L1 (5, 17.5) -> (5, -0.1335) construction
  line L2 (10, 0) -> (10, 17.5) construction
  line L3 (10, 12.5) -> (5, 12.5) construction
  circle A0 centre (5, 12.5) radius 3
  point P0 (-32.5, -7.5)
  dimension "d101" = 6
extrude "Extrusion14" cut sketch "Sketch20" against normal blind 20
sketch "Sketch21" plane through (-293.7, -0.4, -17.5) normal (0, 0, 1) x (1, 0, 0)
  circle A0 centre (-5.5, 3.3) radius 2.125 construction
  line L0 (-5.5, 3.3) -> (-5.5, -2.1) construction
  line L1 (0, -2.1) -> (-10.5, -2.1) construction
  line L2 (0, 0) -> (3.2, 0) construction
  line L3 (0, 0) -> (-5.5, 0) construction
  line L4 (-10.5, -1.14) -> (-5.5, -1.14) construction
  line L5 (-10.5, -1.14) -> (-10.5, -2.1) construction
  point P0 (293.7, 0.4)
  dimension "d104" = 3.3
  dimension "d105" = 5.5
  dimension "d106" = 3.2
  dimension "d107" = 4.25
  dimension "d108" = 4.44
  dimension "d109" = 5
  dimension "d110" = 0.96
properties part number "mtv_frame(BrakeInBack)1-13"
